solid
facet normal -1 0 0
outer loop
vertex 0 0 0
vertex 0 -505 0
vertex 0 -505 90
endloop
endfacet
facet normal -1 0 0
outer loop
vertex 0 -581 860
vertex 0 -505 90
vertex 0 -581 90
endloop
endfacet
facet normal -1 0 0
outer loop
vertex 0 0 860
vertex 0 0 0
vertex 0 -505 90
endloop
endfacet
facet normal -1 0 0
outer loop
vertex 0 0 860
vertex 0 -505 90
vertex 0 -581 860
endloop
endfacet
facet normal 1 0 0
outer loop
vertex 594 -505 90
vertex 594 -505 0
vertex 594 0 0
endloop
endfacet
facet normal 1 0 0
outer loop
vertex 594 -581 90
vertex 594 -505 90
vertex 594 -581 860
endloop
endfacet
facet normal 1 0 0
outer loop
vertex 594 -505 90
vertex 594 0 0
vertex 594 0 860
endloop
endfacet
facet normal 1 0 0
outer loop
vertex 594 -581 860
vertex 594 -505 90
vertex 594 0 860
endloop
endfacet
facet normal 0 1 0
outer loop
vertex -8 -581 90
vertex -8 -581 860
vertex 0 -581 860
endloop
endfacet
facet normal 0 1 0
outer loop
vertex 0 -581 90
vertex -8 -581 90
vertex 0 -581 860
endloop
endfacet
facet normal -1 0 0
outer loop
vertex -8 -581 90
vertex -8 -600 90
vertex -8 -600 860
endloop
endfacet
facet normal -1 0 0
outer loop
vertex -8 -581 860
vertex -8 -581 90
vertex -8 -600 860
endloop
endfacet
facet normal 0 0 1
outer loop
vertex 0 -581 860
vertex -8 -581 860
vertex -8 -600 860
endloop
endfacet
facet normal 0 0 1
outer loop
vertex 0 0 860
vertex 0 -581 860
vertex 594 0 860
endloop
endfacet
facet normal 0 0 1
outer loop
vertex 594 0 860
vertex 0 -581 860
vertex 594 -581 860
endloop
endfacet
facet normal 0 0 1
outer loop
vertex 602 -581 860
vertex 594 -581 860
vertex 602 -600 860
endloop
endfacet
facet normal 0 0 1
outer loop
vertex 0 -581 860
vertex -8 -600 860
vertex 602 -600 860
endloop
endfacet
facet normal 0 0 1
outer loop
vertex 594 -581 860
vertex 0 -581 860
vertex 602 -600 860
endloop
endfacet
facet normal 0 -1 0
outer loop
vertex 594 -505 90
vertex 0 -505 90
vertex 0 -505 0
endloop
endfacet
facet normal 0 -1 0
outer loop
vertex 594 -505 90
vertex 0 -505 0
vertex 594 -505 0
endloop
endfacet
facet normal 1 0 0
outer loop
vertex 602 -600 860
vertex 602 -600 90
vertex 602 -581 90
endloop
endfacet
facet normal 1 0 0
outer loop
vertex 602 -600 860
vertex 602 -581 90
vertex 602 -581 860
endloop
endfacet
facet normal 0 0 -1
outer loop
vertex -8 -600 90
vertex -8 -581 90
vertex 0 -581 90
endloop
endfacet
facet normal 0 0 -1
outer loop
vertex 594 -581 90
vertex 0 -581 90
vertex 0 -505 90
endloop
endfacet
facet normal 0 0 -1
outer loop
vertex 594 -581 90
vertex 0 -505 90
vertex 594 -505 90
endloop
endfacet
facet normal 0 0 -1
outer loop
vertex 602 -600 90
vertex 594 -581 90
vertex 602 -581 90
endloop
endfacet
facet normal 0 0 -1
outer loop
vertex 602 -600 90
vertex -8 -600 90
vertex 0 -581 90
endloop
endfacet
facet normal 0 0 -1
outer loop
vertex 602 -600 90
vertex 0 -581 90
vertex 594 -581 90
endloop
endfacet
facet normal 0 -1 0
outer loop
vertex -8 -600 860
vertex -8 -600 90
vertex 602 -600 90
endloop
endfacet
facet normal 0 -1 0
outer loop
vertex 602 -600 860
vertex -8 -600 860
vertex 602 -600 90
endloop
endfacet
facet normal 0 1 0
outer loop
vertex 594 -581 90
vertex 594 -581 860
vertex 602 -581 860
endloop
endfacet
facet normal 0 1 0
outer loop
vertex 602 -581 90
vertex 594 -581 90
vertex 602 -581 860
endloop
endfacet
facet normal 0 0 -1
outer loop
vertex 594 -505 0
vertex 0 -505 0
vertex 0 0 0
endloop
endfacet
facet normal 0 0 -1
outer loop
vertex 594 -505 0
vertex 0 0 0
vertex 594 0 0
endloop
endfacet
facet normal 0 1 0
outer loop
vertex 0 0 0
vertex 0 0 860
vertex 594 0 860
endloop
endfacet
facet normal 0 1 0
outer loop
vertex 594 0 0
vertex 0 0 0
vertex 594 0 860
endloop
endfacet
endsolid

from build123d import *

# Parameters (mm, degrees)
F0_W     = 594
F0_H     = 860
F1_DEPTH = 600
F2_W     = 8
F2_H     = 860
F3_DEPTH = 19
F4_W     = 610
F4_H     = 90
F5_DEPTH = 95


with BuildPart() as f1:
    # F0 (on Front) → F1 (new body)
    with BuildSketch(Plane.XZ):
        with Locations((297, 430)):
            Rectangle(F0_W, F0_H)
    extrude(amount=F1_DEPTH)

    # F2 (on face) → F3 (join)
    with BuildSketch(Plane.XZ.offset(600)):
        with Locations((-4, 430)):
            Rectangle(F2_W, F2_H)
        with Locations((598, 430)):
            Rectangle(F2_W, F2_H)
    extrude(amount=-F3_DEPTH)

    # F4 (on face) → F5 (cut)
    with BuildSketch(Plane.XZ.offset(600)):
        with Locations((297, 45)):
            Rectangle(F4_W, F4_H)
    extrude(amount=-F5_DEPTH, mode=Mode.SUBTRACT)


solid = f1.part
